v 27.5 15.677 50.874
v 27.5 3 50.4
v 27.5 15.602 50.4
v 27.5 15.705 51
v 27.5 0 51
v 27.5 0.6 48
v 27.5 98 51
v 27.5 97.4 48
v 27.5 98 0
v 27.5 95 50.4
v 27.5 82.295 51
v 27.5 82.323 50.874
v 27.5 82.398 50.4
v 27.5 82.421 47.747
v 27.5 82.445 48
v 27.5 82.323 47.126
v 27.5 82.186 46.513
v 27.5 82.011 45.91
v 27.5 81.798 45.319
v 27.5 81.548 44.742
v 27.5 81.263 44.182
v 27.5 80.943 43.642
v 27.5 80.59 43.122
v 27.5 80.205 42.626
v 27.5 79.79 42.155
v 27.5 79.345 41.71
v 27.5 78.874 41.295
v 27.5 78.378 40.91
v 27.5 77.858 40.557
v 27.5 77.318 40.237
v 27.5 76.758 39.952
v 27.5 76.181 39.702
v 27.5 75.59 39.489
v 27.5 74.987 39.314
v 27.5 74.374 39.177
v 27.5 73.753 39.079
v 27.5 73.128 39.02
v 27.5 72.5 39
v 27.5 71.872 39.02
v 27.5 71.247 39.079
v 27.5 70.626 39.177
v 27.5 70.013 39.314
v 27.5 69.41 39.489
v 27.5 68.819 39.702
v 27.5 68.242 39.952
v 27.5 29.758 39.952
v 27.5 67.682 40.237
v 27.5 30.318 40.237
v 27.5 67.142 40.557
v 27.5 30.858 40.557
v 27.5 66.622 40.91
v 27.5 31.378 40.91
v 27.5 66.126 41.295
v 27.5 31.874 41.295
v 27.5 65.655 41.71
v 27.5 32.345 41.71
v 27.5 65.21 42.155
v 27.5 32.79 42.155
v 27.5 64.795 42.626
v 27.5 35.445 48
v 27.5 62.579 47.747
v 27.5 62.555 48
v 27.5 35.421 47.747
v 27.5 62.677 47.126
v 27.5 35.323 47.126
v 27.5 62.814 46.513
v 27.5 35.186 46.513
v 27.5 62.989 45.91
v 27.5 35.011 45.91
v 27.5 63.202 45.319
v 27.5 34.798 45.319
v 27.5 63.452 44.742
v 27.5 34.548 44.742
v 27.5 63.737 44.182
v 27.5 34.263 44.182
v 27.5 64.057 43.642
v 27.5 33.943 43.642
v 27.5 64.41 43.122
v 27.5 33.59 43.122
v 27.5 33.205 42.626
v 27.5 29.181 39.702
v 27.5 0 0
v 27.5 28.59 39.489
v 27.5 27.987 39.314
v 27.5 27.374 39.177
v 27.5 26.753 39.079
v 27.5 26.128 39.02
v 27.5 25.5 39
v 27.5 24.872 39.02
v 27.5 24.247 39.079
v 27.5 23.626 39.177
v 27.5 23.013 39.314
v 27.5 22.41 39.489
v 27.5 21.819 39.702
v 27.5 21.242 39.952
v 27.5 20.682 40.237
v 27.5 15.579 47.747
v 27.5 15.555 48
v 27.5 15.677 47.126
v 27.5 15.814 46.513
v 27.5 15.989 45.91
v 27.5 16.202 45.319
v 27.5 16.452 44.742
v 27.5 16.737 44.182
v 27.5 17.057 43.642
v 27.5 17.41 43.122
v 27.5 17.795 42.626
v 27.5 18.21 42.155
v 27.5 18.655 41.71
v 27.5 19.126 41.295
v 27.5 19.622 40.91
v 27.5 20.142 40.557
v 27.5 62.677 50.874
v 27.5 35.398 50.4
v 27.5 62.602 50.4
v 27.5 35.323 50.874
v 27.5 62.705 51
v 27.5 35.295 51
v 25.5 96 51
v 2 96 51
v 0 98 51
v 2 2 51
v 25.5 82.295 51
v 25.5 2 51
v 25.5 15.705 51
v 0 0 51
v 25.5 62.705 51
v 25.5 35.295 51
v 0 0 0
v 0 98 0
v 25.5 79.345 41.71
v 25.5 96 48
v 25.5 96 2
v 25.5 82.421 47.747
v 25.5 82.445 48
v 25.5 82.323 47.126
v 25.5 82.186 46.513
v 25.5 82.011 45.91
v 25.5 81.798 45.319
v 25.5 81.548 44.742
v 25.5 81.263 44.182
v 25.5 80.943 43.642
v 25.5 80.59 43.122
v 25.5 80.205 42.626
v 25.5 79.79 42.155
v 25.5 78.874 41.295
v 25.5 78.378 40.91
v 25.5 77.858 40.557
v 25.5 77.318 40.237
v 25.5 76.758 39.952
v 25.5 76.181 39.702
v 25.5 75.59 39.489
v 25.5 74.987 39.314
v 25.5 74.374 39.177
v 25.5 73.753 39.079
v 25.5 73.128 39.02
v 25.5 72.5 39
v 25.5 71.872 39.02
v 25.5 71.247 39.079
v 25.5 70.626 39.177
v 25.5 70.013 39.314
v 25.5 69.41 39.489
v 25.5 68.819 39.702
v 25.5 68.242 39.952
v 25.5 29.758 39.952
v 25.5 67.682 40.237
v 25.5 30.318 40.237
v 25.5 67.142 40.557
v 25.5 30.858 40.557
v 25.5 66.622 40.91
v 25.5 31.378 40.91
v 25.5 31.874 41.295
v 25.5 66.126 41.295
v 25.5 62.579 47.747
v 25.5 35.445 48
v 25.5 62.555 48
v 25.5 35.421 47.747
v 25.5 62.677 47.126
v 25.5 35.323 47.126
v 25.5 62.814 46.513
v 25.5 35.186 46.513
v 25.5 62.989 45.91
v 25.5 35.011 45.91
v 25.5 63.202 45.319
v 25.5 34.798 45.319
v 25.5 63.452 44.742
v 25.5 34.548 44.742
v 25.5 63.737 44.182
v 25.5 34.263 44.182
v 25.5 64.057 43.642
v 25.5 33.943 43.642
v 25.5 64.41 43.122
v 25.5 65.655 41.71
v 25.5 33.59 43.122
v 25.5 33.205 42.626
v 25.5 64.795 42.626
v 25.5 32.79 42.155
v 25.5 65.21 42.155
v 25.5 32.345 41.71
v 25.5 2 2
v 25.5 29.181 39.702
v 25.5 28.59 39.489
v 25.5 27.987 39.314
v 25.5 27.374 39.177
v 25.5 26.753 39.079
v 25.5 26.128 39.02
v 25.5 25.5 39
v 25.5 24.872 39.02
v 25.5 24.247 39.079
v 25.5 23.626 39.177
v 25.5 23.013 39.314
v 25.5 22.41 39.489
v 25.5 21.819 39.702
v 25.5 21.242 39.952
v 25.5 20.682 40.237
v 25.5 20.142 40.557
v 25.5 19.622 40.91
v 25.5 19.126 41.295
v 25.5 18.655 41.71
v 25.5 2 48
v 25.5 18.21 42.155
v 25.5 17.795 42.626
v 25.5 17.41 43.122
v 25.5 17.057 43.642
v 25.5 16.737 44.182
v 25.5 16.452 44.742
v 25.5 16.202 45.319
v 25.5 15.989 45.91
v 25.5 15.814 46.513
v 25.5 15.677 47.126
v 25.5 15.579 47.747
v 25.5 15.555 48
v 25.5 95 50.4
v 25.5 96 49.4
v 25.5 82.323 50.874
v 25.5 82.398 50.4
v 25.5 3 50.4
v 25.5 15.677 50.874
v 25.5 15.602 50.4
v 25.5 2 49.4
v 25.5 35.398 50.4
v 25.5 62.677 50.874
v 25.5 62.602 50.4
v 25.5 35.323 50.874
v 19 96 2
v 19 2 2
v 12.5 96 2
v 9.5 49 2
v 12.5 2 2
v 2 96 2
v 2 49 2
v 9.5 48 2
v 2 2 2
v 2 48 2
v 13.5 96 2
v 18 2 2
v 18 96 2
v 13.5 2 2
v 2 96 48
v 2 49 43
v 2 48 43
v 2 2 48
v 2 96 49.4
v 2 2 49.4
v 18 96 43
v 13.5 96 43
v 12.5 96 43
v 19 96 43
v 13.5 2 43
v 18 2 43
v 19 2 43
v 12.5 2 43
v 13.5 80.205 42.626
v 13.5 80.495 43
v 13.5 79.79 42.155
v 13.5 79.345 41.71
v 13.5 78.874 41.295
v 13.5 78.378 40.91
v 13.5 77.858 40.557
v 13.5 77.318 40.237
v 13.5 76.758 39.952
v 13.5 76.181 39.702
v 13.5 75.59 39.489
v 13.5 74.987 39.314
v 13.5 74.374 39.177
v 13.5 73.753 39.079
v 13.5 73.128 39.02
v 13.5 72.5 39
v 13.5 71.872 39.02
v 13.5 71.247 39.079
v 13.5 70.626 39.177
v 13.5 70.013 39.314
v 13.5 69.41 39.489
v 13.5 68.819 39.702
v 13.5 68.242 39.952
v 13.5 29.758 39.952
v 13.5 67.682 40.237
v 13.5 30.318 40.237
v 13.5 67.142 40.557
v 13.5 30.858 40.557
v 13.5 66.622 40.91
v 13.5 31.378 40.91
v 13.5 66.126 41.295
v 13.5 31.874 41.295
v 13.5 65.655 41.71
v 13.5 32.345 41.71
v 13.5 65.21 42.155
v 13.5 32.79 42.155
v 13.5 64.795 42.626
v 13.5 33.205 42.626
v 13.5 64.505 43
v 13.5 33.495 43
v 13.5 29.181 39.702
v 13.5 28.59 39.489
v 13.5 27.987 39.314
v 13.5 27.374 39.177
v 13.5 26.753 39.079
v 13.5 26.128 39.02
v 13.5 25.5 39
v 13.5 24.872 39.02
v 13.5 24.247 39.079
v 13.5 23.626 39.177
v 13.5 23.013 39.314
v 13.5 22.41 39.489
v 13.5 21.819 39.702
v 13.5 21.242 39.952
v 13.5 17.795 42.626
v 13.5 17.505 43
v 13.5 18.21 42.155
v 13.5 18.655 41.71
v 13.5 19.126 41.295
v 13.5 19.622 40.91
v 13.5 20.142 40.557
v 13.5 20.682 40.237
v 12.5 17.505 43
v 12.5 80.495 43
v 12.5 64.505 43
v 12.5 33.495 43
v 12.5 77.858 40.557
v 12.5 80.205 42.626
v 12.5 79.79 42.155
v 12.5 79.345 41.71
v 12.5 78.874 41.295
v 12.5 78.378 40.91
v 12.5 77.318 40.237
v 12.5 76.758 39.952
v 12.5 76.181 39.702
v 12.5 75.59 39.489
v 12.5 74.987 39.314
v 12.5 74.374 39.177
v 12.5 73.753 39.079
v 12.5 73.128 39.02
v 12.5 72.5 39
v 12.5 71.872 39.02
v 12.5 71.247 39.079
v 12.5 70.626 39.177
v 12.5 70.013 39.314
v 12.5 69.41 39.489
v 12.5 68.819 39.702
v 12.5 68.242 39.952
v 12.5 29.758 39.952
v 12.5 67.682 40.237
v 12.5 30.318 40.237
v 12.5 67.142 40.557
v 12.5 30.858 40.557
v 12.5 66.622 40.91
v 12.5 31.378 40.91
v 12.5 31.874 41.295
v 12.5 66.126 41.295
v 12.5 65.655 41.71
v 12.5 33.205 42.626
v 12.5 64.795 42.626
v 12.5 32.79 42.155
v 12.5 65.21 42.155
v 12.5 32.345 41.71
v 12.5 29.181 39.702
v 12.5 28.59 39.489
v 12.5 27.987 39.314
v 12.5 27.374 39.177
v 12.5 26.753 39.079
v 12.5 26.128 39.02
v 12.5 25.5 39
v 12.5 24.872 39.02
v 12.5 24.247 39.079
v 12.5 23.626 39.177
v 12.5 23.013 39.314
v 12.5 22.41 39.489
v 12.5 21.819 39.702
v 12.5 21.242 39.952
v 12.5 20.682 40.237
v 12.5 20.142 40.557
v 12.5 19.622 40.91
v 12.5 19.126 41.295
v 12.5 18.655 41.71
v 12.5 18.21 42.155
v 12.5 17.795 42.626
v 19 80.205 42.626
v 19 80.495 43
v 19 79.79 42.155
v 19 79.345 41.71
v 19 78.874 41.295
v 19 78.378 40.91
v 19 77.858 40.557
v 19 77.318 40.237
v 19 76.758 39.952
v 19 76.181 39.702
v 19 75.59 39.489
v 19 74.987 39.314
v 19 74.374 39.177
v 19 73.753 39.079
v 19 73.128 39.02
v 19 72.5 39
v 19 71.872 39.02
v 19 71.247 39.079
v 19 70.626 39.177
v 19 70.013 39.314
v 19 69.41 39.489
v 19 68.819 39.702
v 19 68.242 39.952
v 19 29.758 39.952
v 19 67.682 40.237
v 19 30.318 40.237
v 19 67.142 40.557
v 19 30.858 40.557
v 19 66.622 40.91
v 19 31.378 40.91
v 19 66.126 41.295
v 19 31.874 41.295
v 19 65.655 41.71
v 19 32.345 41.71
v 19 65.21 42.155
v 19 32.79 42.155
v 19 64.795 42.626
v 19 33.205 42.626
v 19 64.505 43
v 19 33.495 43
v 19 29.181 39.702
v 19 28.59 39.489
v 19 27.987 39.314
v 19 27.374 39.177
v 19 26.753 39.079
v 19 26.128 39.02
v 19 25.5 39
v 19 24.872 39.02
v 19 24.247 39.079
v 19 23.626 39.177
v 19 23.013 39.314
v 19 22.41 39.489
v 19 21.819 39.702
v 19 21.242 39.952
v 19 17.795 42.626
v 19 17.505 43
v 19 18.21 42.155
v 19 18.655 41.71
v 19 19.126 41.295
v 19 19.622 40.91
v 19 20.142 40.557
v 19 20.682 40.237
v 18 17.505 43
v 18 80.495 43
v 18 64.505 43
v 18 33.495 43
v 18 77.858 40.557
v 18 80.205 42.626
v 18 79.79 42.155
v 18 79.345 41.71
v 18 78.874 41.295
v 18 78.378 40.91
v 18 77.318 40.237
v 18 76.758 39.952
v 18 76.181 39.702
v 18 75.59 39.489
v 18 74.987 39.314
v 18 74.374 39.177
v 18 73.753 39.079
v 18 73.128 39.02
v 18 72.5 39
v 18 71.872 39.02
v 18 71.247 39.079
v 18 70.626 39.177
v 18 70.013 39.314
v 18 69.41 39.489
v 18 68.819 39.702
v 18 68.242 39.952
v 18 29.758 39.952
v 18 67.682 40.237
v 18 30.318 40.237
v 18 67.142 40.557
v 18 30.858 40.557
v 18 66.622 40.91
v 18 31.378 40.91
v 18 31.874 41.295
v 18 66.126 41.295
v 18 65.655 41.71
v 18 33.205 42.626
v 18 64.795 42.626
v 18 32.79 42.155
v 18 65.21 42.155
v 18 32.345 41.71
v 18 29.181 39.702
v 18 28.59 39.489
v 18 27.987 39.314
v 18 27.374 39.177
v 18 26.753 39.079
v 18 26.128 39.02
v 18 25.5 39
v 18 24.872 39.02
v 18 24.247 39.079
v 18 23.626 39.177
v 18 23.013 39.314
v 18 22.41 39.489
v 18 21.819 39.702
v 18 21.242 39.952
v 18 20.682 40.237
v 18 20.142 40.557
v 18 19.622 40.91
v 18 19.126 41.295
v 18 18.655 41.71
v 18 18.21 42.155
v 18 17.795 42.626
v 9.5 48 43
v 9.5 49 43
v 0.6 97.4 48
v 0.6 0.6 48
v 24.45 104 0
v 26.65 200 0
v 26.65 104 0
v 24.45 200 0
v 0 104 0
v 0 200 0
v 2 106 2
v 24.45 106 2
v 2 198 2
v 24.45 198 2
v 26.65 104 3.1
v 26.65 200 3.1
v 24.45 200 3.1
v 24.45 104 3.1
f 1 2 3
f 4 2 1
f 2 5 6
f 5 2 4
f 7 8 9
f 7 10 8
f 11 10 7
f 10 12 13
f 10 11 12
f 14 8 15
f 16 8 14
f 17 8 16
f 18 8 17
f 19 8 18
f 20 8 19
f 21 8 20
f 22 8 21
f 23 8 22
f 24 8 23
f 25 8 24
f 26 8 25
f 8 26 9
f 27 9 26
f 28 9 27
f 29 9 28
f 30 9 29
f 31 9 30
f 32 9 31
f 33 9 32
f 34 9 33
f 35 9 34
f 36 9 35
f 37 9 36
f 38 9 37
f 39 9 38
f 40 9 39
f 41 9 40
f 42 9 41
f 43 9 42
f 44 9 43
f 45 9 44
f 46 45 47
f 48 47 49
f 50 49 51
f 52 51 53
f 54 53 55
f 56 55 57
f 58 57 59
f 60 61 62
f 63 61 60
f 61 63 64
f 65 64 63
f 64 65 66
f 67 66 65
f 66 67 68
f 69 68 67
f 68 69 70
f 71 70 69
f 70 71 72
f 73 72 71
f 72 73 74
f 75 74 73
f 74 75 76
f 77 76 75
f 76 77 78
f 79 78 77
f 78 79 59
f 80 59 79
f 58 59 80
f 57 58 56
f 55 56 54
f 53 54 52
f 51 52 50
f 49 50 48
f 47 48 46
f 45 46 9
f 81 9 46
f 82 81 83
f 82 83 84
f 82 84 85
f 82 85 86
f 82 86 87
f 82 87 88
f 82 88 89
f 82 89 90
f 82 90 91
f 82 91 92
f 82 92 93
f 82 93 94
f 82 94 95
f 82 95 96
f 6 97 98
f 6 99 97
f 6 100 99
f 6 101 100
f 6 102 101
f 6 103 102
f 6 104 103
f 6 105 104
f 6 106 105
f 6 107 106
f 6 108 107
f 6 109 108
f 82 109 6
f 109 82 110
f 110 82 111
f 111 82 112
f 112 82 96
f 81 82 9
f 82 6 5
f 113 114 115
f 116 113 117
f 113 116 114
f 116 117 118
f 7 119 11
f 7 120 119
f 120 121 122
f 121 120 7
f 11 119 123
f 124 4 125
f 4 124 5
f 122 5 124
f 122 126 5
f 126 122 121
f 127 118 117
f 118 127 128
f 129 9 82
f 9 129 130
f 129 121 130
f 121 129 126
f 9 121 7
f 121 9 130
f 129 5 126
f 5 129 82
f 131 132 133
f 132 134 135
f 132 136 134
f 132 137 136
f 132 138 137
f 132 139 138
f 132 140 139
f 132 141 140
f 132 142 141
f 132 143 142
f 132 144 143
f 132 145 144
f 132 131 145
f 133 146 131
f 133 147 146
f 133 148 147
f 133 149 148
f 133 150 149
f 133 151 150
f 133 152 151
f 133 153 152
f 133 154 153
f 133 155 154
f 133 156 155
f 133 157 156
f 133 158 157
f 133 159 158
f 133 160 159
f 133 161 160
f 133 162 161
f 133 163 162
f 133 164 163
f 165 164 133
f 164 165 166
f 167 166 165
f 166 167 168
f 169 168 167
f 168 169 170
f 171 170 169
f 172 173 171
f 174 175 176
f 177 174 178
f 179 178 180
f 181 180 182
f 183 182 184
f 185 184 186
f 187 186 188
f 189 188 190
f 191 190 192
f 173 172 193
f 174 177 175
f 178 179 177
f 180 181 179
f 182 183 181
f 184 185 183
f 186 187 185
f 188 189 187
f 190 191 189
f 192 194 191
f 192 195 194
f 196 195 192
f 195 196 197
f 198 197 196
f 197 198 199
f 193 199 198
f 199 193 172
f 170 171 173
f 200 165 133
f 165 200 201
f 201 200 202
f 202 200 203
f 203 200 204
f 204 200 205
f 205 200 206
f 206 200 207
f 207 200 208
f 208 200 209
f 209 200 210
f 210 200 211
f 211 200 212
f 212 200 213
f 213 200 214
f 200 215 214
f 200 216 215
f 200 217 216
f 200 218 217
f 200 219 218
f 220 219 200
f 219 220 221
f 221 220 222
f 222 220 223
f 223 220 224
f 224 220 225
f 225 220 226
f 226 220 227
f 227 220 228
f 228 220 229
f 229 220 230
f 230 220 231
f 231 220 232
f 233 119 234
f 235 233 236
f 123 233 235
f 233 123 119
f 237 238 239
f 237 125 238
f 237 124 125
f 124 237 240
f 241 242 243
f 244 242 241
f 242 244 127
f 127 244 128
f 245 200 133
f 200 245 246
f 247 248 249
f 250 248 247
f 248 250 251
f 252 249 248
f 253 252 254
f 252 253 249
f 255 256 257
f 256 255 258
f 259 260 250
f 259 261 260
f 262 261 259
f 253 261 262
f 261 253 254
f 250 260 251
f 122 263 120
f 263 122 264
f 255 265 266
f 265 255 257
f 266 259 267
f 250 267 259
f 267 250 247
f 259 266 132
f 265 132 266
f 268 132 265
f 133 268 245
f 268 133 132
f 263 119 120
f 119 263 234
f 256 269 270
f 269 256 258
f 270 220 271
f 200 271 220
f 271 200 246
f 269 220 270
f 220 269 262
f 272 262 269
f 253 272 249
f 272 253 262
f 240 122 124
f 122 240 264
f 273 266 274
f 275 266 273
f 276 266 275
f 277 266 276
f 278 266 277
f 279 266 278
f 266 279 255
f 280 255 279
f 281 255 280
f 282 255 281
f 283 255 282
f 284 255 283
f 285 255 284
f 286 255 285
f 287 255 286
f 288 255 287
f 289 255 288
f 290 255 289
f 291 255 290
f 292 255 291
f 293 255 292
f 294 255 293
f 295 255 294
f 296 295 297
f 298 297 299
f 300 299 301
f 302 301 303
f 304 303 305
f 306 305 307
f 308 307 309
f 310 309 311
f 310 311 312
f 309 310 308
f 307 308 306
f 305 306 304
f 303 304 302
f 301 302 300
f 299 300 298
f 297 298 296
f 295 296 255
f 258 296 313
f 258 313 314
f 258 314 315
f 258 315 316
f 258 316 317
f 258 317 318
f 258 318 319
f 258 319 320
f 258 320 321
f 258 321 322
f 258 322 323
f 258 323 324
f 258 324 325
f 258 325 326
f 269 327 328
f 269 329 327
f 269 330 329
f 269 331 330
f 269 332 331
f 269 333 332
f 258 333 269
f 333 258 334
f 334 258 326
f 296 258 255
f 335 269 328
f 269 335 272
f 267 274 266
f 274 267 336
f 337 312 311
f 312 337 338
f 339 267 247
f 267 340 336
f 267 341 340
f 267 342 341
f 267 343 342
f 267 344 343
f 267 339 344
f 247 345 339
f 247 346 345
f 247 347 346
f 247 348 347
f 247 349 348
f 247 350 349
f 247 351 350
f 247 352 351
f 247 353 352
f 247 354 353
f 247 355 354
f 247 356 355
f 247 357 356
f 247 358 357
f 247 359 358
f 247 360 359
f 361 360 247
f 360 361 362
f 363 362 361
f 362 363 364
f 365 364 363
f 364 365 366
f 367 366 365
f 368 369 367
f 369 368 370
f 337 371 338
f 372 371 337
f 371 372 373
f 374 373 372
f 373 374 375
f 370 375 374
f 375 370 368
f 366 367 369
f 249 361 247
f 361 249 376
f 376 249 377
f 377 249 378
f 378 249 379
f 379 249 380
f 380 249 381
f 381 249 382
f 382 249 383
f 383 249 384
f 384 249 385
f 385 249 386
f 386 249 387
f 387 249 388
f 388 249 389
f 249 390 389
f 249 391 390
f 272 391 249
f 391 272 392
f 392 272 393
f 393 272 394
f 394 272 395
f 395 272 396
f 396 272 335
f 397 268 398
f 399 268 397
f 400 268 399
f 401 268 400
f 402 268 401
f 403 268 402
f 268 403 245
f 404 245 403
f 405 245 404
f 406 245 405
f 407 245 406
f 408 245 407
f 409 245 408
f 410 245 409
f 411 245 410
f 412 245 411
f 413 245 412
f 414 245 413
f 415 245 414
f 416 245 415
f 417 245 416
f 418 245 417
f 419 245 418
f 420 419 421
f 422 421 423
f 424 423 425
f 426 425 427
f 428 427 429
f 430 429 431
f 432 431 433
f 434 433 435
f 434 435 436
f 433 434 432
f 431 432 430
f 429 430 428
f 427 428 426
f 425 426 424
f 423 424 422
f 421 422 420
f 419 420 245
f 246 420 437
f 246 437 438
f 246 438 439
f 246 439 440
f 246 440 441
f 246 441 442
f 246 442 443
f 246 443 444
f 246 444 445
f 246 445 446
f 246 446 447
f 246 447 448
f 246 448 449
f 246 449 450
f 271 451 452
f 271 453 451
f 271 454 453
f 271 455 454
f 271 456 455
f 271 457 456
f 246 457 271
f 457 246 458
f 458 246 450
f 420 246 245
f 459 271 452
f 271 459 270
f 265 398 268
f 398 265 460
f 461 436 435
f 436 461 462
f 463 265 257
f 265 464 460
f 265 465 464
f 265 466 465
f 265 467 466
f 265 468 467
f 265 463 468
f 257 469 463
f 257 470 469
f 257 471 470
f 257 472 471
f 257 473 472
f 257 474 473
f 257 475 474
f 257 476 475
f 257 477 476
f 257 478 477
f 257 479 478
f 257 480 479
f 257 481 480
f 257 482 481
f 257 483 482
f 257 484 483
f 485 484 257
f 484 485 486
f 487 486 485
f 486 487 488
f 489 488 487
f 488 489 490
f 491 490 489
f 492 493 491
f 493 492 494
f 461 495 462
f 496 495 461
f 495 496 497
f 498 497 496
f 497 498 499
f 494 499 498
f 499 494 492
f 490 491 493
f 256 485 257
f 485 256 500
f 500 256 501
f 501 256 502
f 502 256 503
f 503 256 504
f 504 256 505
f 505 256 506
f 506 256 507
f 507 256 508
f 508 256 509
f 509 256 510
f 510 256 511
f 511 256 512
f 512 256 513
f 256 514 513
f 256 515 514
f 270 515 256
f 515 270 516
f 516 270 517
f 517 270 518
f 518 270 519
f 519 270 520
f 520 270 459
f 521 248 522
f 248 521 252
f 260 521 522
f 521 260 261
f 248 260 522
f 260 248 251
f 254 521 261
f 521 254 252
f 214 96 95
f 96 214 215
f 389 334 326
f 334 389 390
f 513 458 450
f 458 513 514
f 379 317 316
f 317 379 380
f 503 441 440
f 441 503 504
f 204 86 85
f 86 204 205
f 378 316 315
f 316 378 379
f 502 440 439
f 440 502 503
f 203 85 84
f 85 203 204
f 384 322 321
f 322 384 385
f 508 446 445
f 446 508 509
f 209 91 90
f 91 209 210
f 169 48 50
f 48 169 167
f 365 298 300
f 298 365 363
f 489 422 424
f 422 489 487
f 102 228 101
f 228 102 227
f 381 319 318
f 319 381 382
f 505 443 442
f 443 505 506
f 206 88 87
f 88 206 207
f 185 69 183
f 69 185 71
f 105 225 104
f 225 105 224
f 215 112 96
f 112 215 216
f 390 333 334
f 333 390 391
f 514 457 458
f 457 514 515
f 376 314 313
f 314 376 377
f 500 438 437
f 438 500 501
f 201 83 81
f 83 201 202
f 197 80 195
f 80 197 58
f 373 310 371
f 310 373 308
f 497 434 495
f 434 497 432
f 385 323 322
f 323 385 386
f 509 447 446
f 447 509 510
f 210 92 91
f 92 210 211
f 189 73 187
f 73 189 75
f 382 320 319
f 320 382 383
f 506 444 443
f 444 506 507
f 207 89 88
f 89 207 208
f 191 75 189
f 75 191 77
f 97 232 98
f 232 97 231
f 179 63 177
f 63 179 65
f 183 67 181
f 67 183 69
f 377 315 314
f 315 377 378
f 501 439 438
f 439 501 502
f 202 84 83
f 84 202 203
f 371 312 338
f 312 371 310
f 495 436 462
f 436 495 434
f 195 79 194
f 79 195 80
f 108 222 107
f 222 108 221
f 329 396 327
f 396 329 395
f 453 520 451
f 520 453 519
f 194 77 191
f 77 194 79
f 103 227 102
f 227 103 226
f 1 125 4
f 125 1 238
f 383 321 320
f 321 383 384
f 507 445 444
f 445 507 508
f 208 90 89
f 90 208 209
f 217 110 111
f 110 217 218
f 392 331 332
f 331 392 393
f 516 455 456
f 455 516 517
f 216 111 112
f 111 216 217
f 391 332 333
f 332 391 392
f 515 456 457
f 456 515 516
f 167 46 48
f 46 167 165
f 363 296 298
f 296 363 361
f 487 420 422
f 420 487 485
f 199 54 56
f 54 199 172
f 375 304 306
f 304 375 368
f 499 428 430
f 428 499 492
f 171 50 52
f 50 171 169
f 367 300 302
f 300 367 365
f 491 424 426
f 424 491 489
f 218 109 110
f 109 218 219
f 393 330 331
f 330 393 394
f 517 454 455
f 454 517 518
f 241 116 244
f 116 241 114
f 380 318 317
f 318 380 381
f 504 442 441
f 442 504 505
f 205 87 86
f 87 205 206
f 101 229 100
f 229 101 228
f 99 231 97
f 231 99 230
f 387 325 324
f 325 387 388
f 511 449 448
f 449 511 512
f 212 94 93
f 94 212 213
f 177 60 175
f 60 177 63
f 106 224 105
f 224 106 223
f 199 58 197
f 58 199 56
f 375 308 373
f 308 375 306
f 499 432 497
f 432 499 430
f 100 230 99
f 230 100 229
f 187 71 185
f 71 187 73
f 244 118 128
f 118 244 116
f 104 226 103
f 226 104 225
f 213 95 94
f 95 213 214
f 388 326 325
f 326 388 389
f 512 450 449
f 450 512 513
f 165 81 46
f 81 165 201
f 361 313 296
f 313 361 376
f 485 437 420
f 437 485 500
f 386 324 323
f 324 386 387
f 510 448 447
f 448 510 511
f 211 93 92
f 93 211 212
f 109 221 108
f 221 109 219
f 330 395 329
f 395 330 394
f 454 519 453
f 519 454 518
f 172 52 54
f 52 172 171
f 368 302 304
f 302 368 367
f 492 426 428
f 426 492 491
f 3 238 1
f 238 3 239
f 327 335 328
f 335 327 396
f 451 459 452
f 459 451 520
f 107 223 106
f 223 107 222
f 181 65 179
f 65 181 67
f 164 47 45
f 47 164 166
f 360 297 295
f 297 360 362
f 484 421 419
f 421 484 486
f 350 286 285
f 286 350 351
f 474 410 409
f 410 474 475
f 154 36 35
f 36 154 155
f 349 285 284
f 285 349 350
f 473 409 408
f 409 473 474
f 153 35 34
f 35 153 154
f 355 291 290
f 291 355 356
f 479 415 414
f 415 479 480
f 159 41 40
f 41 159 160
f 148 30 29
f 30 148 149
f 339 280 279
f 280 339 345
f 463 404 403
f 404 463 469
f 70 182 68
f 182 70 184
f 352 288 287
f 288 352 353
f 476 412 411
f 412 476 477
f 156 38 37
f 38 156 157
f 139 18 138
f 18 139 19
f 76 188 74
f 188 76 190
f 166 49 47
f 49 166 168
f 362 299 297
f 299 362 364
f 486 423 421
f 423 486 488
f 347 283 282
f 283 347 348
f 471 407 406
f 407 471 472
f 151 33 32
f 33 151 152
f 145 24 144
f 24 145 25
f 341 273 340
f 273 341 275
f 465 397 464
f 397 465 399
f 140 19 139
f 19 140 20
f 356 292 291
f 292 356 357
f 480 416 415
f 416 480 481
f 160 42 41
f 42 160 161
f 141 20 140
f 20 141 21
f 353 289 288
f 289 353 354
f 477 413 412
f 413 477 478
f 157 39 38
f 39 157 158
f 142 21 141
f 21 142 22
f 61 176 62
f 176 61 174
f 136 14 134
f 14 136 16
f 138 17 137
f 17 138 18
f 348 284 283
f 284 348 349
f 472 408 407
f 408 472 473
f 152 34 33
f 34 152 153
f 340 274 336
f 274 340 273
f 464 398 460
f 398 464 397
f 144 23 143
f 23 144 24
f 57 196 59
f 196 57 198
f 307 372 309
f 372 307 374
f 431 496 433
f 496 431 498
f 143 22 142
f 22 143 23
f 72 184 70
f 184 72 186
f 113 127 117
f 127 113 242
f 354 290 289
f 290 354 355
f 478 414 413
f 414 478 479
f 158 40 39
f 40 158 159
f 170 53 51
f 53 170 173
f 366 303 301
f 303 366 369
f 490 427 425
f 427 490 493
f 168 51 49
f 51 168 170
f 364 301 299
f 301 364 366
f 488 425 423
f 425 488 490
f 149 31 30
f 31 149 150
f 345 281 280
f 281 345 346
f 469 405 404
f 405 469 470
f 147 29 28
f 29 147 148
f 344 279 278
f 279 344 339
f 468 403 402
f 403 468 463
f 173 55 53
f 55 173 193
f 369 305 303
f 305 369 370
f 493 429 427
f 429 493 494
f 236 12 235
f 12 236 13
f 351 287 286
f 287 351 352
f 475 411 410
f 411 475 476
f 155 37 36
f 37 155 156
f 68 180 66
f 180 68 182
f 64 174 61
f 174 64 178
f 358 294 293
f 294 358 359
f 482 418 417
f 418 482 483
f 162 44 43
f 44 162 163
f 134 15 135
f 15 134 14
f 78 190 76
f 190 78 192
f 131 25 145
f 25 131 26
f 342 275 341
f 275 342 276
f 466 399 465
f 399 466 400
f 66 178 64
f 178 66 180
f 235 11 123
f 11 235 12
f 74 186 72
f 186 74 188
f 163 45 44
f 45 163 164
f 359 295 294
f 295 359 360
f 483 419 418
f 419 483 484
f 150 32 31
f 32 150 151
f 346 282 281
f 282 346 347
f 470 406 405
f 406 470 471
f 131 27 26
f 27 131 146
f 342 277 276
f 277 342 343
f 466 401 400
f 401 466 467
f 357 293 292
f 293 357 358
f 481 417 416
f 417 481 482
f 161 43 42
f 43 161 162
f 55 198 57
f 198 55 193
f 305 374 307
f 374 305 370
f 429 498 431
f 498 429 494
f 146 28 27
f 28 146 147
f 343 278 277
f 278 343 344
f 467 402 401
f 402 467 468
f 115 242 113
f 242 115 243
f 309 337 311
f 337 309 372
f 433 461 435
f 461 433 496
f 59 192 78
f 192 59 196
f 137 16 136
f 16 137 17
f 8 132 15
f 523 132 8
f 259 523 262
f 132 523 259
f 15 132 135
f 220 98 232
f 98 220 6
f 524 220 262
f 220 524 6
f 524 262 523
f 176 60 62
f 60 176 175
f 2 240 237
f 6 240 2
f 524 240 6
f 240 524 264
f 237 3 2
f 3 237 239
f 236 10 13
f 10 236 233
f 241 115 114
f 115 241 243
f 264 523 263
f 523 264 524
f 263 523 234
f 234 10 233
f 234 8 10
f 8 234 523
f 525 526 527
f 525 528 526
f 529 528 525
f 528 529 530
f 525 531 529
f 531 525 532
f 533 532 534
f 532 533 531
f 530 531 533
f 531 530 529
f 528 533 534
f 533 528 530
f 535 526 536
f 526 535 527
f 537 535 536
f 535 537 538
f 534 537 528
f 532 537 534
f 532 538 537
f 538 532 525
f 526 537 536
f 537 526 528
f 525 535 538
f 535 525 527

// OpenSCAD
// file: carcassonne_box.scad
/**
 * @file carcassonne_box.scad
 * @author Conlan Wesson (modified by [Your Name])
 * Template for Carcassonne boxes.
 * @copyright Creative Commons Attribution-NonCommercial-ShareAlike 4.0
 */

mm = 1;
cm = 10*mm;

width = 47*mm;
thick = 2.5*mm;
wall = 2*mm;

/**
 * Lid for box.
 * @param sections Array of section lengths.
 * @param columns Number of columns.
 * @param icon Path to icon DXF file.
 * @param rot Icon rotation in degrees.
 * @param mult Icon scale.
 * @param xoff X-offset of icon from center.
 * @param yoff Y-offset of icon from center.
 */
module carcassonne_lid(sections, columns=1, icon=false, icon2=false, icon3=false, rot=0, mult=1, xoff=0, yoff=0, mult2=1, xoff2=0, yoff2=0, mult3=1, xoff3=0, yoff3=0, g=0){
    length = sum(sections) + ((width/2) - (sum(sections) % (width/2)));
    w = length+(1.5*wall)+.1;
    l = (width*columns)+wall;
    h = wall;
    d = 2;

    CubePoints = [
        [ 0-g, 0-g,   0 ],  //0
        [ w+g, 0-g,   0 ],  //1
        [ w+g, l+g,   0 ],  //2
        [ 0-g, l+g,   0 ],  //3
        [   d,   d, h+g ],  //4
        [   w,   d, h+g ],  //5
        [   w, l-d, h+g ],  //6
        [   d, l-d, h+g ]   //7
    ];
    
    CubeFaces = [
        [0,1,2,3],  // bottom
        [4,5,1,0],  // front
        [7,6,5,4],  // top
        [5,6,2,1],  // right
        [6,7,3,2],  // back
        [7,4,0,3]   // left
    ];
    
    difference(){
        union(){
            polyhedron( CubePoints, CubeFaces );
            translate([w-wall-.15,0,0]) cube([wall+.2,l, (1.5*wall)+.1]);
        }
        if(icon){
            translate([w/2+xoff,l/3+yoff,h-(wall/2)]){
                linear_extrude(height=(wall)+.1){
                    rotate(rot) scale(mult) import(icon);
                }
            }
        }
        if(icon2){
            translate([w/2+xoff2,l/3+yoff2,h-(wall/2)]){
                linear_extrude(height=(wall)+.1){
                    rotate(rot) scale(mult2) import(icon2);
                }
            }
        }
        if(icon3){
            translate([w/2+xoff3,l/3+yoff3,h-(wall/2)]){
                linear_extrude(height=(wall)+.1){
                    rotate(rot) scale(mult3) import(icon3);
                }
            }
        }
    }
}

/**
 * Carcassonne card box.
 * @param sections Array of section lengths.
 * @param columns Number of columns.
 */
module carcassonne_box(sections, columns=1){
    raw_length = sum(sections);
    extra_space = ((width/2) - (raw_length % (width/2))) % (width/2);
    length = raw_length + extra_space;
    
    section_count = len(sections);
    adjusted_sections = [for (i = [0:section_count-1]) 
        sections[i] + (extra_space / section_count)];
    
    difference(){
        union(){
            difference(){
                // Outer walls
                cube([length+(2*wall), (width*columns)+(2*wall), width+(2*wall)]);
                // Cavity
                translate([wall, wall, wall]){
                    cube([length, width*columns, (width+wall)+.1]);
                }
            }
            // Dividers
            for(col = [0:columns-1]){
                divider_positions = [for(i=0; i<len(adjusted_sections)-1; i=i+1) 
                    sum([for(j=[0:i]) adjusted_sections[j]])];
                for(pos = divider_positions){
                    translate([pos+wall, width*col+wall, 0]) 
                        cube([wall/2, width, width-(2*wall)]);
                }
                if(col > 0){
                    translate([0, width*col+(wall/2), 0]) 
                        cube([length+(2*wall)-18.0, wall/2, width-(2*wall)]);
                }
            }
        }
        union(){
            // Notch
            for(col = [0:columns-1]){
                translate([wall, wall+(width*col), wall]){
                    translate([0, width/2, width])
                    rotate([0, 90, 0]){
                        cylinder(r=10, h=length+(2*wall), $fn=100);
                    }
                }
            }
            // Track
            translate([wall/2,wall/2,width+wall/2]) 
                carcassonne_lid(adjusted_sections, columns, g=0.4);
        }
    }
}

// Helper function to sum an array
function sum(v, i = 0, r = 0) = i < len(v) ? sum(v, i + 1, r + v[i]) : r;
// main file
/**
 * @file leipzig.scad
 * @author Andrew Hargrave
 * The Markets of Leipzig Carcossonne box.
 * @copyright Creative Commons Attribution-NonCommercial-ShareAlike 4.0
 */

// TODO: This one has two columns
include <carcassonne_box.scad>

mm = 1;
tiles = 2*mm;

sections = [4*tiles, 3*mm, 5*mm];
columns = 2;
icon="0-leipzig.dxf";

carcassonne_box(sections, columns);
translate([0,width*columns+10,0]) carcassonne_lid(sections, columns, icon, rot=90, mult=2.2, xoff=21, yoff=-9); 
